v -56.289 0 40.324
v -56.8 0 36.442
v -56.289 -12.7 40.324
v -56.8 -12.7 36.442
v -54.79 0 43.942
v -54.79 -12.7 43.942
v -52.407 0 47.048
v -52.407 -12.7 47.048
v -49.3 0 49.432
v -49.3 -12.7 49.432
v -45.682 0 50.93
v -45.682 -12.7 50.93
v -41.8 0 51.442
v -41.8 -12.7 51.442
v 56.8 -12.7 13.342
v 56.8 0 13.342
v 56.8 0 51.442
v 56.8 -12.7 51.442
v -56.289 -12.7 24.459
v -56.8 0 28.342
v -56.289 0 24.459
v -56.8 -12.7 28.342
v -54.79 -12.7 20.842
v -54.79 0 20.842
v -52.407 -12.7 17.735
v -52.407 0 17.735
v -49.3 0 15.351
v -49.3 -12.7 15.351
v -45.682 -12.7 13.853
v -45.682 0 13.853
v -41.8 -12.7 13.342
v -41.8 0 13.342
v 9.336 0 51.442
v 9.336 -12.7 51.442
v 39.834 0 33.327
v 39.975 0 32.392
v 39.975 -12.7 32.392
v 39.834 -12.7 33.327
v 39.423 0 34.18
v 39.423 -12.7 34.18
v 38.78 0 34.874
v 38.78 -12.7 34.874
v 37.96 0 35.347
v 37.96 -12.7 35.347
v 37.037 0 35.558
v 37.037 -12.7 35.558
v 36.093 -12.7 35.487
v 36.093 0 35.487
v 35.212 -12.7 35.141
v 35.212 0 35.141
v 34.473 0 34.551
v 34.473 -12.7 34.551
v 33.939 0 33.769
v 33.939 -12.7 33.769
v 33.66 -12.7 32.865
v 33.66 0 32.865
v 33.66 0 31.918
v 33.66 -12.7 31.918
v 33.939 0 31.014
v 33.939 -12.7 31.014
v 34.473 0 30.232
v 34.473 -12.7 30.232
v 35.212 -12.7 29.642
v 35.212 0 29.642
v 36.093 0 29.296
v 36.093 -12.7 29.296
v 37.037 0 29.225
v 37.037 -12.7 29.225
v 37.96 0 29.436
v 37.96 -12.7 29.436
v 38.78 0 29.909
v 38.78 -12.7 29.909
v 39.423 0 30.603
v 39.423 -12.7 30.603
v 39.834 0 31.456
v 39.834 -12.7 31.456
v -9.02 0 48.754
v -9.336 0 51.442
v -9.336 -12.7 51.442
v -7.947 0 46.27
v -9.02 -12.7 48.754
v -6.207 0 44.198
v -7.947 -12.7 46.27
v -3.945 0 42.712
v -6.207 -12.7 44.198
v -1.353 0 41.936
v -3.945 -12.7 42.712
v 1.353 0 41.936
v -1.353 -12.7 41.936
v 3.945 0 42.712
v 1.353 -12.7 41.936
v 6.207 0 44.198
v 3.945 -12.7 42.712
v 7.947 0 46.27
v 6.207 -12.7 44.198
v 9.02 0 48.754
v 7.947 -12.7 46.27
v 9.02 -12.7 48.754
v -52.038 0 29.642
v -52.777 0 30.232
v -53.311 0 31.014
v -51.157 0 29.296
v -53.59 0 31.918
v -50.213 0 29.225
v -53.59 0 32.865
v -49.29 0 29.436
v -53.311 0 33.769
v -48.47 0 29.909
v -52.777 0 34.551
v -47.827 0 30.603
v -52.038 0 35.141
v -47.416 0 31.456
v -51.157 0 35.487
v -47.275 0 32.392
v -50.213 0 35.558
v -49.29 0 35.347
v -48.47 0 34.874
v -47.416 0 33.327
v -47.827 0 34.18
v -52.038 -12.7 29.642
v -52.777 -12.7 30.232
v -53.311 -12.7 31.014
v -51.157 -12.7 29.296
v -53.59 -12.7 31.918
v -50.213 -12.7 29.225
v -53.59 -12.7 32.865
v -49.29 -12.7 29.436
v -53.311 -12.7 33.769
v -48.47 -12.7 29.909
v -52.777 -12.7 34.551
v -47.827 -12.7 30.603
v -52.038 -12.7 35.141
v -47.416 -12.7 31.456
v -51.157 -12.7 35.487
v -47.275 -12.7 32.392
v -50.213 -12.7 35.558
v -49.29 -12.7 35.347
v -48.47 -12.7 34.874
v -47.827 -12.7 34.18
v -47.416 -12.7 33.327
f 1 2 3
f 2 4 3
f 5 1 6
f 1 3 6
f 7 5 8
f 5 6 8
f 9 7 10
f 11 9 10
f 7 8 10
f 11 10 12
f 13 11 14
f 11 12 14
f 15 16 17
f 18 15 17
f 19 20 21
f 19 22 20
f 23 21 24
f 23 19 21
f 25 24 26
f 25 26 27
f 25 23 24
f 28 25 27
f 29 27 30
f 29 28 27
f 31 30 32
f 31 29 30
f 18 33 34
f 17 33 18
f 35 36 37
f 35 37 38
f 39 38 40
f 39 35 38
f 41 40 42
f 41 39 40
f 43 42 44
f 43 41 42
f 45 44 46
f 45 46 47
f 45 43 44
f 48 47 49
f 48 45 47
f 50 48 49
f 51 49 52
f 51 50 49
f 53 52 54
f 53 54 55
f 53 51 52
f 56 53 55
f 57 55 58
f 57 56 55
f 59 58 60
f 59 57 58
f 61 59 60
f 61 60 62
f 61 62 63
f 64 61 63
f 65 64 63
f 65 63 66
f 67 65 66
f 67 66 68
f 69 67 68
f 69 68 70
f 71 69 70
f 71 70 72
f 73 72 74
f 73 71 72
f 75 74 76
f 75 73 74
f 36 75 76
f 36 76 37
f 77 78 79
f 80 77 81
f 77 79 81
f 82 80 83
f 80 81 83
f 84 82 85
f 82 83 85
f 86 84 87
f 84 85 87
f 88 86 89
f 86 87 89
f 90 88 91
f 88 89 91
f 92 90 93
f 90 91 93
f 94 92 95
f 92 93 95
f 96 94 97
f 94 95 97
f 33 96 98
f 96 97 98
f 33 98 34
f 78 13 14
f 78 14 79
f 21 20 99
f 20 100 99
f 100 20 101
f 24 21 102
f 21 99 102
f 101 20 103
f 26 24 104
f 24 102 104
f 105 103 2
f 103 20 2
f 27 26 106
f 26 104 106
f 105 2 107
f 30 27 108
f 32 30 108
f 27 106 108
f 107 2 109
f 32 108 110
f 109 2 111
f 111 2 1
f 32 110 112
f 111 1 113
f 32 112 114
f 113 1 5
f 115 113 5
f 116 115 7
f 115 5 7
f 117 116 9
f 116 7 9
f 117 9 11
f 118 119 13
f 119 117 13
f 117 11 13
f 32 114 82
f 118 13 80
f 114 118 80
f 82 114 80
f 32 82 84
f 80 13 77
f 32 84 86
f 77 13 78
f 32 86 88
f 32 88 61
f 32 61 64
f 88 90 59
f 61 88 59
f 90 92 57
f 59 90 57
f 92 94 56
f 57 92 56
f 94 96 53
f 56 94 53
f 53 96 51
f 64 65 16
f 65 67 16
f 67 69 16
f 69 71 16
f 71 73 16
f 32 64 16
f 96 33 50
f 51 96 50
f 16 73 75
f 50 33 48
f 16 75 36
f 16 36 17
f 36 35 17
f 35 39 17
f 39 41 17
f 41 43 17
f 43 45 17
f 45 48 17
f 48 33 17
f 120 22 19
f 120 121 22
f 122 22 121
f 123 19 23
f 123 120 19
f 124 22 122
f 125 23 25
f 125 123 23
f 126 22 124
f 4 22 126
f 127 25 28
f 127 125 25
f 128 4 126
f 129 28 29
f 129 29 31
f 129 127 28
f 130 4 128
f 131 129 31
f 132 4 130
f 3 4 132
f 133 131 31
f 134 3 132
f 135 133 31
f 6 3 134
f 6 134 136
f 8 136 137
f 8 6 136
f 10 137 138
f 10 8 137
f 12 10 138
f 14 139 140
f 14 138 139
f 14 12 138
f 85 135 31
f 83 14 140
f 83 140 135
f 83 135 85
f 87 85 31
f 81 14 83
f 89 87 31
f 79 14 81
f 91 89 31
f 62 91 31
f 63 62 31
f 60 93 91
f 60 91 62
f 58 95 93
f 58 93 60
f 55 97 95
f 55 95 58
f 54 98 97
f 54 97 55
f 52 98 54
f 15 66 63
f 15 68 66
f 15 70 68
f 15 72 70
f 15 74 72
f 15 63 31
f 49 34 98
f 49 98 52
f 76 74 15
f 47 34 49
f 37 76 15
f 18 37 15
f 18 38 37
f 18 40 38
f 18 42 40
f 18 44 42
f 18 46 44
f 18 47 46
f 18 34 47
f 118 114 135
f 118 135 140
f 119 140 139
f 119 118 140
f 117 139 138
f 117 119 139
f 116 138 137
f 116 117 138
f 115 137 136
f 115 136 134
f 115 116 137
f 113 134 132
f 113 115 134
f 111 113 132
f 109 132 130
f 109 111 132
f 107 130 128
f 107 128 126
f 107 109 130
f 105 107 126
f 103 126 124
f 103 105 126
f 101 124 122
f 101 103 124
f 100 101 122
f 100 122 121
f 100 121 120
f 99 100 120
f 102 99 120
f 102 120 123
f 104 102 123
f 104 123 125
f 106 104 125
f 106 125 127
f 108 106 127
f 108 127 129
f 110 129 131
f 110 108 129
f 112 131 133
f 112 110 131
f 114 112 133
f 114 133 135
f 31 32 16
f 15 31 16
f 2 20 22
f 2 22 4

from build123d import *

# Parameters (mm, degrees)
F0_W     = 113.6
F0_H     = 38.1
F0_R     = 3.175
F1_DEPTH = 12.7
F2_R     = 15
F3_R     = 9.34
F4_DEPTH = 15.4


with BuildPart() as f1:
    # F0 (on Front) → F1 (new body)
    with BuildSketch(Plane.XZ):
        with Locations((0, 32.391511)):
            Rectangle(F0_W, F0_H)
        with Locations((-50.45, 32.391511)):
            Circle(F0_R, mode=Mode.SUBTRACT)
        with Locations((36.8, 32.391511)):
            Circle(F0_R, mode=Mode.SUBTRACT)
    extrude(amount=F1_DEPTH)

    # F2
    f2_edges = [f1.edges().sort_by_distance(p)[0] for p in [
        (-56.8, -6.35, 51.441511),
        (-56.8, -6.35, 13.341511),
    ]]
    fillet(f2_edges, radius=F2_R)

    # F3 (on face) → F4 (cut)
    with BuildSketch(Plane.XZ.offset(12.7)):
        with Locations((0, 51.177656)):
            Circle(F3_R)
    extrude(amount=-F4_DEPTH, mode=Mode.SUBTRACT)


solid = f1.part
